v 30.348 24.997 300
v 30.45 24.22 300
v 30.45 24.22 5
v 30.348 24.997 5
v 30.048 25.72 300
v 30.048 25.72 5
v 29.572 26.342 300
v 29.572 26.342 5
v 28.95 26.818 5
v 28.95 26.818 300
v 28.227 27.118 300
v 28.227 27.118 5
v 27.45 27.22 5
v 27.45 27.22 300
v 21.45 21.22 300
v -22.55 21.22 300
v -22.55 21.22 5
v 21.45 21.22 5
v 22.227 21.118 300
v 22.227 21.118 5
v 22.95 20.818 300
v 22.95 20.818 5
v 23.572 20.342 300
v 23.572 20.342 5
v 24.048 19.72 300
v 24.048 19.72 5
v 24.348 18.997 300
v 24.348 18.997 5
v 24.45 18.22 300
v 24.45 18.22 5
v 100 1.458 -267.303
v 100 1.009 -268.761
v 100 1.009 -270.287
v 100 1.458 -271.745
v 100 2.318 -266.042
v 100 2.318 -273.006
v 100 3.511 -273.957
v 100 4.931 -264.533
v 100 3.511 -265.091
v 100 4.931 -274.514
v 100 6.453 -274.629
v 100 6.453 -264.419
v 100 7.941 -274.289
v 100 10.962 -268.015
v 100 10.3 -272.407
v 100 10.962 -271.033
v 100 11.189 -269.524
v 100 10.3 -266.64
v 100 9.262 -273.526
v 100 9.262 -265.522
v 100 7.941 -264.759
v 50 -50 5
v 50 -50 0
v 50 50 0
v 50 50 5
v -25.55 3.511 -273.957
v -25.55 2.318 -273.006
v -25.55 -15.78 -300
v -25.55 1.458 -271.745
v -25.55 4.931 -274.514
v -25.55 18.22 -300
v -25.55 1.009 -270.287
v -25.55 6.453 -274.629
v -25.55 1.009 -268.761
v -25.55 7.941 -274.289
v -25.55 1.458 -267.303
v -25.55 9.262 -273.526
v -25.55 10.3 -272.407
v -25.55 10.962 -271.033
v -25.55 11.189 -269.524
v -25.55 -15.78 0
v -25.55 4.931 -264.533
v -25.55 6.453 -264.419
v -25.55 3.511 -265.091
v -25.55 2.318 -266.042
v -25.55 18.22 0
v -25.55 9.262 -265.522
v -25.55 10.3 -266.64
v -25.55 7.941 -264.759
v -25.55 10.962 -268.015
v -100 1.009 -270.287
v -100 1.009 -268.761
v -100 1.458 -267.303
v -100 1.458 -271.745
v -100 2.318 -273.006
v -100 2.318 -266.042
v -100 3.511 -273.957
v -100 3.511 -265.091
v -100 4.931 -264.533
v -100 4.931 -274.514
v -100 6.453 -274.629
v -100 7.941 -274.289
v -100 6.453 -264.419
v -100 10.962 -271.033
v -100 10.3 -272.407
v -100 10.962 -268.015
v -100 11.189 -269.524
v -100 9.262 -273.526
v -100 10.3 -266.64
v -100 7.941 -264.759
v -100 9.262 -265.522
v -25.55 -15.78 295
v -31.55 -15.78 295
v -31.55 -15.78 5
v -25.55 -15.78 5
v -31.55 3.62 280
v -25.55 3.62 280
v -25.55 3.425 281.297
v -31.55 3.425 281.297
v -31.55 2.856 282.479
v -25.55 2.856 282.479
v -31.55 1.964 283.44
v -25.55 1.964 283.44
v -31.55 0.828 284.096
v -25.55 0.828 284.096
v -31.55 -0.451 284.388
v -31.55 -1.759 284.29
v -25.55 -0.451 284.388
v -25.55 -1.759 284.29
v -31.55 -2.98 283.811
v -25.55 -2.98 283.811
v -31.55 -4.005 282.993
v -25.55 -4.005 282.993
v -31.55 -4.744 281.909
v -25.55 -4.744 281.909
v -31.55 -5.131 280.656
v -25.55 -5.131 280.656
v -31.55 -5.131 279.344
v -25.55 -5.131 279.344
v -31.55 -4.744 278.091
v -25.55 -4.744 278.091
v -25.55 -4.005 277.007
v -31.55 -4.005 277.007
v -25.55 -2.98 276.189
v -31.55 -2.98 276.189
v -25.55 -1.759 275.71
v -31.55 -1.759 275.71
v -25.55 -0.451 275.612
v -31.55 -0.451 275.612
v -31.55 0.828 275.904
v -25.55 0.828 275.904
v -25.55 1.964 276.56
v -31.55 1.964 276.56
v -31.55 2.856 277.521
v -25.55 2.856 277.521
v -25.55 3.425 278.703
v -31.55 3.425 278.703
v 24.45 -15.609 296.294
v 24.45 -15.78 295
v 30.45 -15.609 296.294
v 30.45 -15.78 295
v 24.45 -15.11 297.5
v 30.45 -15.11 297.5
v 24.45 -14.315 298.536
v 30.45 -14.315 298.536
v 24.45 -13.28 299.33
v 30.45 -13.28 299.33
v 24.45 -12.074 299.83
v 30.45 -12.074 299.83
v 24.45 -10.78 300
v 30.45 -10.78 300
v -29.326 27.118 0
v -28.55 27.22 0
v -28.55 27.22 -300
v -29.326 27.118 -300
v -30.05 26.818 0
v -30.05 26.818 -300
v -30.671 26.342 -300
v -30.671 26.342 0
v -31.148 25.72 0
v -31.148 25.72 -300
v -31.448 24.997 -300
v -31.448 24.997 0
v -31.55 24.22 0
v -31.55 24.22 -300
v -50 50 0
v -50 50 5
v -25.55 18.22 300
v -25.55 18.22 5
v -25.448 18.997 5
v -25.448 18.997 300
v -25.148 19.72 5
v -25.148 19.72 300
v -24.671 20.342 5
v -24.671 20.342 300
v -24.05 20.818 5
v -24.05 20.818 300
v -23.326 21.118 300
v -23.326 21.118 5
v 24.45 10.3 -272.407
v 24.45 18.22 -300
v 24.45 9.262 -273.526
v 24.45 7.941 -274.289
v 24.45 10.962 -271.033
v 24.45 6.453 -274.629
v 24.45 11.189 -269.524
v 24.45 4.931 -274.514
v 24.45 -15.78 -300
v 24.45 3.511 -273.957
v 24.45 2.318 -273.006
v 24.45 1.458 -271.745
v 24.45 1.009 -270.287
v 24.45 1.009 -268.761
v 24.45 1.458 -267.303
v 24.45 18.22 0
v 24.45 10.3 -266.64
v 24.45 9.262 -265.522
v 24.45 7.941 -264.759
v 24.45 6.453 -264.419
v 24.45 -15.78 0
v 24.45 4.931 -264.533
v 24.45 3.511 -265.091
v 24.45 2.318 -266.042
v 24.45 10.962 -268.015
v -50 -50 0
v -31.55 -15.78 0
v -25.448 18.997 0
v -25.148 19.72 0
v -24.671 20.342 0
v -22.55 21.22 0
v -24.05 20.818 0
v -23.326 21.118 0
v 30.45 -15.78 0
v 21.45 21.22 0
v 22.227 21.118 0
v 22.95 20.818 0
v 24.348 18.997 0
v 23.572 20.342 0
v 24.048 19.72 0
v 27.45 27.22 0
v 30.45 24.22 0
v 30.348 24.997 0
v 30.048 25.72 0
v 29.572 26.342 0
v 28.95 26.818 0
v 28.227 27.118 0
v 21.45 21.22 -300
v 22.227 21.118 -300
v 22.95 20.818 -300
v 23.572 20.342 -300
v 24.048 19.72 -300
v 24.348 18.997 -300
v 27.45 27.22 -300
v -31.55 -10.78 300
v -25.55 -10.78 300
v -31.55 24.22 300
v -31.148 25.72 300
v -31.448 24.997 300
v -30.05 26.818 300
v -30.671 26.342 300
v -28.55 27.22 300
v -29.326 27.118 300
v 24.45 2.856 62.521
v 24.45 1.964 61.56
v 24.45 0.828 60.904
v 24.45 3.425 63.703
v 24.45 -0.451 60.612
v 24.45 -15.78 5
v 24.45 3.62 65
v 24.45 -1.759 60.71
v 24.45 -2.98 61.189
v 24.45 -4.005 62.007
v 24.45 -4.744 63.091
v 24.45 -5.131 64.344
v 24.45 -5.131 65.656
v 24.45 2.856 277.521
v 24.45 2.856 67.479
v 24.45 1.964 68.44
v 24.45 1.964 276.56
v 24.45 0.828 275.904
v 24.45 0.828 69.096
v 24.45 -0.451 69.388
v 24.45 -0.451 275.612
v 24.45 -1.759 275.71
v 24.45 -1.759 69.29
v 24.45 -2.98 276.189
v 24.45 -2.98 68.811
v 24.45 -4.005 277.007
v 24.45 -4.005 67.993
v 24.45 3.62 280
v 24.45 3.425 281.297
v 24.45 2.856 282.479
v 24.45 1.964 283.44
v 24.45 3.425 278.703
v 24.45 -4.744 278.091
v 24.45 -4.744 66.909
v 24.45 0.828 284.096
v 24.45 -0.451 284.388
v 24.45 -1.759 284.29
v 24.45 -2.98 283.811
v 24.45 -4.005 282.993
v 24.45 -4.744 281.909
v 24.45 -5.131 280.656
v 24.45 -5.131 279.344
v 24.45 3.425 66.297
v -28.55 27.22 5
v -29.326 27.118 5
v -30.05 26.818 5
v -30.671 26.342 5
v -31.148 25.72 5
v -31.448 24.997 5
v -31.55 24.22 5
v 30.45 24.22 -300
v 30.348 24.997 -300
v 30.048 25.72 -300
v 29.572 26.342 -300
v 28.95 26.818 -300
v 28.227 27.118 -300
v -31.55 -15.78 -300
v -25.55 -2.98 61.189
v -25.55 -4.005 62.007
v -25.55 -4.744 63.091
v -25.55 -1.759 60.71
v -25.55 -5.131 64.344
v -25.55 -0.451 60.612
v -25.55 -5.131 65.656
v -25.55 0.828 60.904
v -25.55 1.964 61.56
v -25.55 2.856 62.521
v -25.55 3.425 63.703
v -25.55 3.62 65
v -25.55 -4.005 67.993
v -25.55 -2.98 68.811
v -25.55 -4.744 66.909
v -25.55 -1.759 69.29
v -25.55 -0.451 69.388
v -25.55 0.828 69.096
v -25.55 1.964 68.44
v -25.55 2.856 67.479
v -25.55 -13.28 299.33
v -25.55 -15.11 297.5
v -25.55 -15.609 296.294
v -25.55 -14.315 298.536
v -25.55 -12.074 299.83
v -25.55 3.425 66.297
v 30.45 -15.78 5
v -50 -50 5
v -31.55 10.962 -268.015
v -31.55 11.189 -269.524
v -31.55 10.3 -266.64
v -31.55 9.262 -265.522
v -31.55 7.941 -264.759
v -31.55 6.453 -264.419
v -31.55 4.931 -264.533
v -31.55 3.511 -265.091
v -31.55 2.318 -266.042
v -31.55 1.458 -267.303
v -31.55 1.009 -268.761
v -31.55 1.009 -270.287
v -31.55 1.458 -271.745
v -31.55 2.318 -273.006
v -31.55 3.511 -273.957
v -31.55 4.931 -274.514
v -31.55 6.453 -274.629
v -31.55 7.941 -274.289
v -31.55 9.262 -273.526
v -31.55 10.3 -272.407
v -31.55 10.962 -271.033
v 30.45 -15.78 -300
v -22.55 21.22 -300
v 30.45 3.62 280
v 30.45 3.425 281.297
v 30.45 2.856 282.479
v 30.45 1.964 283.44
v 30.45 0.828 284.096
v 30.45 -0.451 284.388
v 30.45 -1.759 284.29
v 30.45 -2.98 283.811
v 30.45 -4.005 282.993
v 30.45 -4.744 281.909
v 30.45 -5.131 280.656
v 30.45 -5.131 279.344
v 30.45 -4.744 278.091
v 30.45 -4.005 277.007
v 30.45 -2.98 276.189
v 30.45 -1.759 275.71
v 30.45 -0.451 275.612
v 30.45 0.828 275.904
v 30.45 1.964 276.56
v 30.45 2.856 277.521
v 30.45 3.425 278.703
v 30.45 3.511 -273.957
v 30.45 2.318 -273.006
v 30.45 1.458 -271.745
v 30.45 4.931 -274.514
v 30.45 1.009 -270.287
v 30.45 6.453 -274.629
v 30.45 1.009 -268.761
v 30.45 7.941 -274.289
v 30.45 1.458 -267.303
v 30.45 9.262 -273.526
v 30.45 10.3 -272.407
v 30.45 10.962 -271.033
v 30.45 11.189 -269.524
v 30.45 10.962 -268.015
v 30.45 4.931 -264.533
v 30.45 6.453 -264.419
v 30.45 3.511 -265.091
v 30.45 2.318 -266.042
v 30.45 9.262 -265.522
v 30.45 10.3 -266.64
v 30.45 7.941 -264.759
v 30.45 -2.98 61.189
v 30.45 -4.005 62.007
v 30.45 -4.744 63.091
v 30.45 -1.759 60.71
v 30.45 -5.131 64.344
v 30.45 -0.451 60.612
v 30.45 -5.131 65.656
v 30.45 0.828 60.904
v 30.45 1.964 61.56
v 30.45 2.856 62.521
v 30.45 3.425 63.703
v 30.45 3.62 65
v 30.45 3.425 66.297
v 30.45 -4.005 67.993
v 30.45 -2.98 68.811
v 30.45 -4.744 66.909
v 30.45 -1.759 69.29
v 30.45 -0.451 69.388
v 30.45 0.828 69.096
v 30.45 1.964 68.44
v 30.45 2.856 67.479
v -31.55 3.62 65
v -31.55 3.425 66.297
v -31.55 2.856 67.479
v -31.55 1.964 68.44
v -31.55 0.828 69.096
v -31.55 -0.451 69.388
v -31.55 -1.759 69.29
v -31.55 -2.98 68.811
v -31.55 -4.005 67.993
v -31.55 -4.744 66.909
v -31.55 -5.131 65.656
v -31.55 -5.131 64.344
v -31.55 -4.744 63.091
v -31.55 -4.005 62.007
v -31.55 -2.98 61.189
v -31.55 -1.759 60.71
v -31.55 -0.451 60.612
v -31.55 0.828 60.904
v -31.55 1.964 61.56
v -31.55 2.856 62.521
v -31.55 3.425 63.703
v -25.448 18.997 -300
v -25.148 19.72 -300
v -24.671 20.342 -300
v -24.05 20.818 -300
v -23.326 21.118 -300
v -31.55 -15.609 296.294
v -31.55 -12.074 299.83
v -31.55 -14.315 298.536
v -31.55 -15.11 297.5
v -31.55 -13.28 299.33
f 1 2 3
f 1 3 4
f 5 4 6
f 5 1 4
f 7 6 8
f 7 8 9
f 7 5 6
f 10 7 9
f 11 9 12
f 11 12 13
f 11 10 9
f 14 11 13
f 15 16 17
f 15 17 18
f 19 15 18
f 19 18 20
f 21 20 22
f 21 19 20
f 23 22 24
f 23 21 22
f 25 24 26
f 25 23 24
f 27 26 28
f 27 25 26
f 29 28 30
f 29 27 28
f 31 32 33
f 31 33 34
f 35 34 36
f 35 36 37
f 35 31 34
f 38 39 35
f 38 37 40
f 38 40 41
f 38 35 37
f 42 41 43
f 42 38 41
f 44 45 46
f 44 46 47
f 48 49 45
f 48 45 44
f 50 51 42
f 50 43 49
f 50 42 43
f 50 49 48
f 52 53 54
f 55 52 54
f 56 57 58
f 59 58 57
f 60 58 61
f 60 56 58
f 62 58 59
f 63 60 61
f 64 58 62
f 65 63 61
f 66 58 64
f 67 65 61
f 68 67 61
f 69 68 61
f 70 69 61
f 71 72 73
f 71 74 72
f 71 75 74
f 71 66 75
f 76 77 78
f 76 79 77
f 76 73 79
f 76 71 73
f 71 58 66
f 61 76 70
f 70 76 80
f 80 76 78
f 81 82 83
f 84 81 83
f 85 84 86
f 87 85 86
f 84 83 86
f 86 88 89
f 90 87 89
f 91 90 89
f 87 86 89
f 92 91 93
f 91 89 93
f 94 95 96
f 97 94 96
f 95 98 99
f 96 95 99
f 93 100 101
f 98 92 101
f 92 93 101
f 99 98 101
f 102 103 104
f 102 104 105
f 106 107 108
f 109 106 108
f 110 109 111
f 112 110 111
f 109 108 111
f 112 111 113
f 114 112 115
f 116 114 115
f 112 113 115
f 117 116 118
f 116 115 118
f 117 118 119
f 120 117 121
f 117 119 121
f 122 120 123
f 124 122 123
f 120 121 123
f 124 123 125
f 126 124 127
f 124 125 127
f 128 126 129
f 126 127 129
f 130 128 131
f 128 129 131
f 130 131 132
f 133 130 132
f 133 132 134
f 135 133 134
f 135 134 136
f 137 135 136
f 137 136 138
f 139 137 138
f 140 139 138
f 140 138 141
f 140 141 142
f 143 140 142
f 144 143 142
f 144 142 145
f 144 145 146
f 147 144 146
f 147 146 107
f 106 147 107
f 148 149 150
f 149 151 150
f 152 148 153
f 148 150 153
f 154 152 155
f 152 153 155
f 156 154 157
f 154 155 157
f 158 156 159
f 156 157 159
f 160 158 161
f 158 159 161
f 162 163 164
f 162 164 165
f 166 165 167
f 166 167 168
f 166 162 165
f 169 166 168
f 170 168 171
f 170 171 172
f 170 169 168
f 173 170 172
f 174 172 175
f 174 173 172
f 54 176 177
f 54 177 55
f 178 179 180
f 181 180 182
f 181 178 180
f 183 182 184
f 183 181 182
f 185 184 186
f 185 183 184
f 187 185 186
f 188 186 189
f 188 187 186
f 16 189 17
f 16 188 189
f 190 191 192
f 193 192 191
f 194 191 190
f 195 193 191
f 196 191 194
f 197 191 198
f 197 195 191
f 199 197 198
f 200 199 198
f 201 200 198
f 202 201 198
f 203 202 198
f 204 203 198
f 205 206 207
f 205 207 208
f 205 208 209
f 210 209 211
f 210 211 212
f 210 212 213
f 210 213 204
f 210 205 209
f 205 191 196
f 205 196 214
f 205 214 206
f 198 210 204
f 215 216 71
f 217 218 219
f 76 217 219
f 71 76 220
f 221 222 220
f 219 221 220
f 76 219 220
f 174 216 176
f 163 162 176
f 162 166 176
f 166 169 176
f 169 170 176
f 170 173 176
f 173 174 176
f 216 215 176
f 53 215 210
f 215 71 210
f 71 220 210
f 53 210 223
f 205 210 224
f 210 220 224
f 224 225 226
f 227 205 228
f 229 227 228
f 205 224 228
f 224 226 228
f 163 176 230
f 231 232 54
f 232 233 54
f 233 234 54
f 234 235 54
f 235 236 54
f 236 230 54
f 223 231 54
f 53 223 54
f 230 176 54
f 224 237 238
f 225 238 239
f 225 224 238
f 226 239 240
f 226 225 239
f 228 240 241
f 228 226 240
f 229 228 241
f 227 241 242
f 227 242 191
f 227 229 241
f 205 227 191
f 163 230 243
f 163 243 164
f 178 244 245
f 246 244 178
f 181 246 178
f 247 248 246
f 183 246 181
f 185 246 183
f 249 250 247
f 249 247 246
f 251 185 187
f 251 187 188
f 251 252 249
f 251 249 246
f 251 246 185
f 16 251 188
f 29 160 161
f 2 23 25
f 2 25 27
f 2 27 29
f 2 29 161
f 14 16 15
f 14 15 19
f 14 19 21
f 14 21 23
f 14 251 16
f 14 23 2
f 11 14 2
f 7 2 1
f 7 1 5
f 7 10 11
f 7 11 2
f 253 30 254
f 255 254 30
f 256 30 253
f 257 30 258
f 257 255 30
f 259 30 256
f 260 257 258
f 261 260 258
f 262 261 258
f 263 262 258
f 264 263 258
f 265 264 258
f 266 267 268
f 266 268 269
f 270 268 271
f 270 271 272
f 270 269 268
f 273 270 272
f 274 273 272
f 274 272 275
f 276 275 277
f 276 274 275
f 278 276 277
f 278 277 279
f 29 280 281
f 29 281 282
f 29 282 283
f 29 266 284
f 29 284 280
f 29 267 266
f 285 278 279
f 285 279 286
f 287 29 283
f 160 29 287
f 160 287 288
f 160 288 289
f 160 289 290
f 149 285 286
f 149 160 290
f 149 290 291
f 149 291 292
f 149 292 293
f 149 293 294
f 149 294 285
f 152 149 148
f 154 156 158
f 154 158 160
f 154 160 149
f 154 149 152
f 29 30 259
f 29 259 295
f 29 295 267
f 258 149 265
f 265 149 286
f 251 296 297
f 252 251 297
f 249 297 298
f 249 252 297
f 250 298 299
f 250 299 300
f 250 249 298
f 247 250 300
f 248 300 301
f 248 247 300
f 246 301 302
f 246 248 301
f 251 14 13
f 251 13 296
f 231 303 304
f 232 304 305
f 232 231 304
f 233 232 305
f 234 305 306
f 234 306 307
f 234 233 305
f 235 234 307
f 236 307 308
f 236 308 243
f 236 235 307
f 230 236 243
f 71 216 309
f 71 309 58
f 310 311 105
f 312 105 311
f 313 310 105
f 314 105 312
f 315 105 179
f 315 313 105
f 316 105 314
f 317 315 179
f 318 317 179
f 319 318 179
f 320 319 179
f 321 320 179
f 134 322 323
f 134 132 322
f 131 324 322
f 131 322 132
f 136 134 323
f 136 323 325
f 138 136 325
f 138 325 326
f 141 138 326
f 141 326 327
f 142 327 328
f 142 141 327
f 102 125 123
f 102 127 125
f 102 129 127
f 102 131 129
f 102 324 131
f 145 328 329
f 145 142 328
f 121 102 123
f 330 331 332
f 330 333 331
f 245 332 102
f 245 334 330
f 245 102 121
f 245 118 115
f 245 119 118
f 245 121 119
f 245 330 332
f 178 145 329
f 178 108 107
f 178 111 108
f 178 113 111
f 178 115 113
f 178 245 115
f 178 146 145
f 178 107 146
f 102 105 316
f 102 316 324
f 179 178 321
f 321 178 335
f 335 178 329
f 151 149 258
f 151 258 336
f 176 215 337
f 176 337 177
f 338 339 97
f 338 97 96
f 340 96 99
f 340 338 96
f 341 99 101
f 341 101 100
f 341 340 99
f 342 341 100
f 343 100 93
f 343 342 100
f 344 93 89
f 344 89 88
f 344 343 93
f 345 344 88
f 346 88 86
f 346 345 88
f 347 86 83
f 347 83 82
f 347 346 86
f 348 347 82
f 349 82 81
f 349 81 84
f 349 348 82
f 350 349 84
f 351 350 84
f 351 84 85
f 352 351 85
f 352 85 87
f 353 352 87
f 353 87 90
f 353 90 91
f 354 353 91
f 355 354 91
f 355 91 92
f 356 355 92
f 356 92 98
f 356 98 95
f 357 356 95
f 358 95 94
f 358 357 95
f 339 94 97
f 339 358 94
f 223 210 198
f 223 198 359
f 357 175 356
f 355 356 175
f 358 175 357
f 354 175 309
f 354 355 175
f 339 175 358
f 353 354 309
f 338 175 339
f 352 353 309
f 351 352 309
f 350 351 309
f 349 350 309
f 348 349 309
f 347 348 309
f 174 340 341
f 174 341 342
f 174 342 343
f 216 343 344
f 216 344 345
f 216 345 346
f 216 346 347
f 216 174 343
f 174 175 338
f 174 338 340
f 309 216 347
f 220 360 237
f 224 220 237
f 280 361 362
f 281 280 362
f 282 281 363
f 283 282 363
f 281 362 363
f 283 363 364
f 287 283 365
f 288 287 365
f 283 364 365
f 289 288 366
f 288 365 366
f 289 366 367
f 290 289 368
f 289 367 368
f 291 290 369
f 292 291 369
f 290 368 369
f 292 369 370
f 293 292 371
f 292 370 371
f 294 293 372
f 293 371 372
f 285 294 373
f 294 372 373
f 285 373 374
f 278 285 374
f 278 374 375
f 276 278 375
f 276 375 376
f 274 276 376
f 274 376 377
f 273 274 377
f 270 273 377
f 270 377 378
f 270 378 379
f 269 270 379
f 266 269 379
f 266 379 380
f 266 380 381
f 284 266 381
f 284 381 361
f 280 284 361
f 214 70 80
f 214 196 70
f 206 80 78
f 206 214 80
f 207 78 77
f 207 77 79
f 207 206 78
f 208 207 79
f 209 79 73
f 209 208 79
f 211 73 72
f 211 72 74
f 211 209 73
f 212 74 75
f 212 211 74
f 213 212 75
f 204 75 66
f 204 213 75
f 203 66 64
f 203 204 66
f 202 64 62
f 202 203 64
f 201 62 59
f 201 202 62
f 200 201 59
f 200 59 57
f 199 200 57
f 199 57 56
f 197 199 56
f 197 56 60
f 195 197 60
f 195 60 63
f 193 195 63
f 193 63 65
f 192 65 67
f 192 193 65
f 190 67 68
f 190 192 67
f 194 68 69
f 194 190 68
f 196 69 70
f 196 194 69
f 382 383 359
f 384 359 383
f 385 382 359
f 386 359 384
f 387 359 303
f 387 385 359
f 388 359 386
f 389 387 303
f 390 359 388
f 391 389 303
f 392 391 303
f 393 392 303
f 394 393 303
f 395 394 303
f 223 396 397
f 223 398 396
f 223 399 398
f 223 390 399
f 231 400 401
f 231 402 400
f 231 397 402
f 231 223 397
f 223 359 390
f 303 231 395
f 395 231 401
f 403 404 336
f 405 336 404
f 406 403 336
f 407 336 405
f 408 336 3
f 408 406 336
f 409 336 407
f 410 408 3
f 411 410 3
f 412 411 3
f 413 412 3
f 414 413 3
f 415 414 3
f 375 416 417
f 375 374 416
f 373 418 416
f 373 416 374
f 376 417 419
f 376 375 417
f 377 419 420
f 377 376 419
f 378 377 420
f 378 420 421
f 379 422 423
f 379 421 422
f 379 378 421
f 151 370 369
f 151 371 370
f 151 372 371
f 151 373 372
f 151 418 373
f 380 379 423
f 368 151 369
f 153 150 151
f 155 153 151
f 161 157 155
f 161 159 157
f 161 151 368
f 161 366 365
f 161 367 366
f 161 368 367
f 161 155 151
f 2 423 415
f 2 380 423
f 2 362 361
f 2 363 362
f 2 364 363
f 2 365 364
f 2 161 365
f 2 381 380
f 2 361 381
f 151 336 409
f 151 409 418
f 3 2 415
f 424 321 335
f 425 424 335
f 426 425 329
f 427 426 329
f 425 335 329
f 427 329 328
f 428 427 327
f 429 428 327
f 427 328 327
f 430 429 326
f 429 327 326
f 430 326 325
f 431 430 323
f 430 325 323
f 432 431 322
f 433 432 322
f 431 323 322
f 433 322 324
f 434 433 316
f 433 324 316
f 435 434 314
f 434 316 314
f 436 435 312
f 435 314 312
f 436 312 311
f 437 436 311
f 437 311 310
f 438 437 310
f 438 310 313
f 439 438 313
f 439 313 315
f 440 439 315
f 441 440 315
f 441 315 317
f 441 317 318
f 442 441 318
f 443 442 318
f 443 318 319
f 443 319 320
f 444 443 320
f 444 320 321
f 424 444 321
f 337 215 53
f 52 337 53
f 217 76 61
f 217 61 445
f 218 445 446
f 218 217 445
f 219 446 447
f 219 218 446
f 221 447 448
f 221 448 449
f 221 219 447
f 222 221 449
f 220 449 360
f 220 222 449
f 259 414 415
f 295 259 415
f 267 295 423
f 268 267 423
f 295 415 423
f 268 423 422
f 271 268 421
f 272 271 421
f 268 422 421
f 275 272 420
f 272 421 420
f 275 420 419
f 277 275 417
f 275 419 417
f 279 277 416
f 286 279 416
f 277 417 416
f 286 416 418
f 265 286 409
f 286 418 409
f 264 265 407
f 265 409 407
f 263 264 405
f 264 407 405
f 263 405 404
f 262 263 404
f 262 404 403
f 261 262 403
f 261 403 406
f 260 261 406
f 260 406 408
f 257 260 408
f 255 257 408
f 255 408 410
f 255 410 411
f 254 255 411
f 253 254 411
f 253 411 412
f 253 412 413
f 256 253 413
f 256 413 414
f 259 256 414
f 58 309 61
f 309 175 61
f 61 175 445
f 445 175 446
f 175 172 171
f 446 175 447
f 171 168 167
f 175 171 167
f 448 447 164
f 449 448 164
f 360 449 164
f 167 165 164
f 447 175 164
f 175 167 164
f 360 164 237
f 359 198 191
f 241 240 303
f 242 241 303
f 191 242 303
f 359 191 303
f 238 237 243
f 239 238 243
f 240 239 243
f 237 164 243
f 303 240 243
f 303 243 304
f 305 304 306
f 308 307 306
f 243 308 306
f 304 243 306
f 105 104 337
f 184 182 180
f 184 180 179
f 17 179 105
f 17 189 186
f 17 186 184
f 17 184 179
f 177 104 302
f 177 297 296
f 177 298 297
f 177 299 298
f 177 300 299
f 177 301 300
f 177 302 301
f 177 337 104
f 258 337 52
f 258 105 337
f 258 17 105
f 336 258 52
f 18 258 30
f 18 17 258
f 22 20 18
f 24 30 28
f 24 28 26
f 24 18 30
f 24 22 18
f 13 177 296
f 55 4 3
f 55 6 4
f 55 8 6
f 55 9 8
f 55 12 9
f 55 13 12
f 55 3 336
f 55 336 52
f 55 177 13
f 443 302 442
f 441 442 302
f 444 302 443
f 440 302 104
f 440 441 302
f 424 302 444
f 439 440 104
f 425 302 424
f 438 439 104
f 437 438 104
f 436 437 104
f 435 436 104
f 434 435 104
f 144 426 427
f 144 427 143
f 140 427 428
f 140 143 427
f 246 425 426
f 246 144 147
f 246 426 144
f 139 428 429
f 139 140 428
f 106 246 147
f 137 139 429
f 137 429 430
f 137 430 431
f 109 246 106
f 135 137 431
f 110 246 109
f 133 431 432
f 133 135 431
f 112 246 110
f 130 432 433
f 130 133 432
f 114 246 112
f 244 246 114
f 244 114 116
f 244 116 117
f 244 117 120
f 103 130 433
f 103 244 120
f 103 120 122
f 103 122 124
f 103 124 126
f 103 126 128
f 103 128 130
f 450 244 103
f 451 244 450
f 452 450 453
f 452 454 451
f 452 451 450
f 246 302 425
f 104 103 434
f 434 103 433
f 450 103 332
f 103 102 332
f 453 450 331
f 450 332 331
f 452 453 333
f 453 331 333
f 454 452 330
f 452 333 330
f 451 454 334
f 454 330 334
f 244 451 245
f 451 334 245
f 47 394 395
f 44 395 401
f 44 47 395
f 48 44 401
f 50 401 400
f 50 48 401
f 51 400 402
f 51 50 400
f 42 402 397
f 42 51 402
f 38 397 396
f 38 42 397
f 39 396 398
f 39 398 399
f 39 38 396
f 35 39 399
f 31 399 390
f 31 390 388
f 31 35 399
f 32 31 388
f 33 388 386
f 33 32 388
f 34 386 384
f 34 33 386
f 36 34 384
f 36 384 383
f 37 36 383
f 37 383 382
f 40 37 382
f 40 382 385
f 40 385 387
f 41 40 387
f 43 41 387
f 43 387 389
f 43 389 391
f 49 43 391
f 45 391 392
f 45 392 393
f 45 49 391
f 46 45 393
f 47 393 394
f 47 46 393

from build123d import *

# Parameters (mm, degrees)
F1_DEPTH = 300
F2_W     = 100
F2_H     = 100
F3_DEPTH = 5
F5_D     = 8.8
F6_R     = 5
F7_R     = 5.1189485143
F8_DEPTH = 100


with BuildPart() as f1:
    # F0 (on Top) → F1 (new body, symmetric)
    with BuildSketch(Plane.XY):
        with BuildLine():
            Line((-31.5497371938, -15.77975575), (-25.5497371938, -15.77975575))
            Line((-25.5497371938, -15.77975575), (-25.5497371938, 18.2202439159))
            ThreePointArc((-25.5497371938, 18.2202439159), (-24.6710575374, 20.3415642595), (-22.5497371938, 21.2202439159))
            Line((-22.5497371938, 21.2202439159), (21.4502628062, 21.2202439159))
            ThreePointArc((21.4502628062, 21.2202439159), (23.5715831497, 20.3415642595), (24.4502628062, 18.2202439159))
            Line((24.4502628062, 18.2202439159), (24.4502628062, -15.77975575))
            Line((24.4502628062, -15.77975575), (30.4502628062, -15.77975575))
            Line((30.4502628062, -15.77975575), (30.4502628062, 24.2202439159))
            ThreePointArc((30.4502628062, 24.2202439159), (29.5715831497, 26.3415642595), (27.4502628062, 27.2202439159))
            Line((27.4502628062, 27.2202439159), (-28.5497371938, 27.2202439159))
            ThreePointArc((-28.5497371938, 27.2202439159), (-30.6710575374, 26.3415642595), (-31.5497371938, 24.2202439159))
            Line((-31.5497371938, 24.2202439159), (-31.5497371938, -15.77975575))
        make_face()
    extrude(amount=F1_DEPTH, both=True)

    # F2 (on Top) → F3 (join)
    with BuildSketch(Plane.XY):
        Rectangle(F2_W, F2_H)
    extrude(amount=F3_DEPTH)

    # F5 (through all)
    with Locations(Plane(origin=(-31.5497371938, 0, 0), x_dir=(0, -1, 0), z_dir=(-1, 0, 0))):
        with Locations((0.77975575, 280), (0.77975575, 65)):
            Hole(F5_D / 2)

    # F6
    f6_edges = [f1.edges().sort_by_distance(p)[0] for p in [
        (-28.549737, -15.779756, 300),
        (27.450263, -15.779756, 300),
    ]]
    fillet(f6_edges, radius=F6_R)

    # F7 (on Right) → F8 (join, symmetric)
    with BuildSketch(Plane.YZ):
        with Locations((6.0703633353, -269.5238888264)):
            Circle(F7_R)
    extrude(amount=F8_DEPTH, both=True)


solid = f1.part
